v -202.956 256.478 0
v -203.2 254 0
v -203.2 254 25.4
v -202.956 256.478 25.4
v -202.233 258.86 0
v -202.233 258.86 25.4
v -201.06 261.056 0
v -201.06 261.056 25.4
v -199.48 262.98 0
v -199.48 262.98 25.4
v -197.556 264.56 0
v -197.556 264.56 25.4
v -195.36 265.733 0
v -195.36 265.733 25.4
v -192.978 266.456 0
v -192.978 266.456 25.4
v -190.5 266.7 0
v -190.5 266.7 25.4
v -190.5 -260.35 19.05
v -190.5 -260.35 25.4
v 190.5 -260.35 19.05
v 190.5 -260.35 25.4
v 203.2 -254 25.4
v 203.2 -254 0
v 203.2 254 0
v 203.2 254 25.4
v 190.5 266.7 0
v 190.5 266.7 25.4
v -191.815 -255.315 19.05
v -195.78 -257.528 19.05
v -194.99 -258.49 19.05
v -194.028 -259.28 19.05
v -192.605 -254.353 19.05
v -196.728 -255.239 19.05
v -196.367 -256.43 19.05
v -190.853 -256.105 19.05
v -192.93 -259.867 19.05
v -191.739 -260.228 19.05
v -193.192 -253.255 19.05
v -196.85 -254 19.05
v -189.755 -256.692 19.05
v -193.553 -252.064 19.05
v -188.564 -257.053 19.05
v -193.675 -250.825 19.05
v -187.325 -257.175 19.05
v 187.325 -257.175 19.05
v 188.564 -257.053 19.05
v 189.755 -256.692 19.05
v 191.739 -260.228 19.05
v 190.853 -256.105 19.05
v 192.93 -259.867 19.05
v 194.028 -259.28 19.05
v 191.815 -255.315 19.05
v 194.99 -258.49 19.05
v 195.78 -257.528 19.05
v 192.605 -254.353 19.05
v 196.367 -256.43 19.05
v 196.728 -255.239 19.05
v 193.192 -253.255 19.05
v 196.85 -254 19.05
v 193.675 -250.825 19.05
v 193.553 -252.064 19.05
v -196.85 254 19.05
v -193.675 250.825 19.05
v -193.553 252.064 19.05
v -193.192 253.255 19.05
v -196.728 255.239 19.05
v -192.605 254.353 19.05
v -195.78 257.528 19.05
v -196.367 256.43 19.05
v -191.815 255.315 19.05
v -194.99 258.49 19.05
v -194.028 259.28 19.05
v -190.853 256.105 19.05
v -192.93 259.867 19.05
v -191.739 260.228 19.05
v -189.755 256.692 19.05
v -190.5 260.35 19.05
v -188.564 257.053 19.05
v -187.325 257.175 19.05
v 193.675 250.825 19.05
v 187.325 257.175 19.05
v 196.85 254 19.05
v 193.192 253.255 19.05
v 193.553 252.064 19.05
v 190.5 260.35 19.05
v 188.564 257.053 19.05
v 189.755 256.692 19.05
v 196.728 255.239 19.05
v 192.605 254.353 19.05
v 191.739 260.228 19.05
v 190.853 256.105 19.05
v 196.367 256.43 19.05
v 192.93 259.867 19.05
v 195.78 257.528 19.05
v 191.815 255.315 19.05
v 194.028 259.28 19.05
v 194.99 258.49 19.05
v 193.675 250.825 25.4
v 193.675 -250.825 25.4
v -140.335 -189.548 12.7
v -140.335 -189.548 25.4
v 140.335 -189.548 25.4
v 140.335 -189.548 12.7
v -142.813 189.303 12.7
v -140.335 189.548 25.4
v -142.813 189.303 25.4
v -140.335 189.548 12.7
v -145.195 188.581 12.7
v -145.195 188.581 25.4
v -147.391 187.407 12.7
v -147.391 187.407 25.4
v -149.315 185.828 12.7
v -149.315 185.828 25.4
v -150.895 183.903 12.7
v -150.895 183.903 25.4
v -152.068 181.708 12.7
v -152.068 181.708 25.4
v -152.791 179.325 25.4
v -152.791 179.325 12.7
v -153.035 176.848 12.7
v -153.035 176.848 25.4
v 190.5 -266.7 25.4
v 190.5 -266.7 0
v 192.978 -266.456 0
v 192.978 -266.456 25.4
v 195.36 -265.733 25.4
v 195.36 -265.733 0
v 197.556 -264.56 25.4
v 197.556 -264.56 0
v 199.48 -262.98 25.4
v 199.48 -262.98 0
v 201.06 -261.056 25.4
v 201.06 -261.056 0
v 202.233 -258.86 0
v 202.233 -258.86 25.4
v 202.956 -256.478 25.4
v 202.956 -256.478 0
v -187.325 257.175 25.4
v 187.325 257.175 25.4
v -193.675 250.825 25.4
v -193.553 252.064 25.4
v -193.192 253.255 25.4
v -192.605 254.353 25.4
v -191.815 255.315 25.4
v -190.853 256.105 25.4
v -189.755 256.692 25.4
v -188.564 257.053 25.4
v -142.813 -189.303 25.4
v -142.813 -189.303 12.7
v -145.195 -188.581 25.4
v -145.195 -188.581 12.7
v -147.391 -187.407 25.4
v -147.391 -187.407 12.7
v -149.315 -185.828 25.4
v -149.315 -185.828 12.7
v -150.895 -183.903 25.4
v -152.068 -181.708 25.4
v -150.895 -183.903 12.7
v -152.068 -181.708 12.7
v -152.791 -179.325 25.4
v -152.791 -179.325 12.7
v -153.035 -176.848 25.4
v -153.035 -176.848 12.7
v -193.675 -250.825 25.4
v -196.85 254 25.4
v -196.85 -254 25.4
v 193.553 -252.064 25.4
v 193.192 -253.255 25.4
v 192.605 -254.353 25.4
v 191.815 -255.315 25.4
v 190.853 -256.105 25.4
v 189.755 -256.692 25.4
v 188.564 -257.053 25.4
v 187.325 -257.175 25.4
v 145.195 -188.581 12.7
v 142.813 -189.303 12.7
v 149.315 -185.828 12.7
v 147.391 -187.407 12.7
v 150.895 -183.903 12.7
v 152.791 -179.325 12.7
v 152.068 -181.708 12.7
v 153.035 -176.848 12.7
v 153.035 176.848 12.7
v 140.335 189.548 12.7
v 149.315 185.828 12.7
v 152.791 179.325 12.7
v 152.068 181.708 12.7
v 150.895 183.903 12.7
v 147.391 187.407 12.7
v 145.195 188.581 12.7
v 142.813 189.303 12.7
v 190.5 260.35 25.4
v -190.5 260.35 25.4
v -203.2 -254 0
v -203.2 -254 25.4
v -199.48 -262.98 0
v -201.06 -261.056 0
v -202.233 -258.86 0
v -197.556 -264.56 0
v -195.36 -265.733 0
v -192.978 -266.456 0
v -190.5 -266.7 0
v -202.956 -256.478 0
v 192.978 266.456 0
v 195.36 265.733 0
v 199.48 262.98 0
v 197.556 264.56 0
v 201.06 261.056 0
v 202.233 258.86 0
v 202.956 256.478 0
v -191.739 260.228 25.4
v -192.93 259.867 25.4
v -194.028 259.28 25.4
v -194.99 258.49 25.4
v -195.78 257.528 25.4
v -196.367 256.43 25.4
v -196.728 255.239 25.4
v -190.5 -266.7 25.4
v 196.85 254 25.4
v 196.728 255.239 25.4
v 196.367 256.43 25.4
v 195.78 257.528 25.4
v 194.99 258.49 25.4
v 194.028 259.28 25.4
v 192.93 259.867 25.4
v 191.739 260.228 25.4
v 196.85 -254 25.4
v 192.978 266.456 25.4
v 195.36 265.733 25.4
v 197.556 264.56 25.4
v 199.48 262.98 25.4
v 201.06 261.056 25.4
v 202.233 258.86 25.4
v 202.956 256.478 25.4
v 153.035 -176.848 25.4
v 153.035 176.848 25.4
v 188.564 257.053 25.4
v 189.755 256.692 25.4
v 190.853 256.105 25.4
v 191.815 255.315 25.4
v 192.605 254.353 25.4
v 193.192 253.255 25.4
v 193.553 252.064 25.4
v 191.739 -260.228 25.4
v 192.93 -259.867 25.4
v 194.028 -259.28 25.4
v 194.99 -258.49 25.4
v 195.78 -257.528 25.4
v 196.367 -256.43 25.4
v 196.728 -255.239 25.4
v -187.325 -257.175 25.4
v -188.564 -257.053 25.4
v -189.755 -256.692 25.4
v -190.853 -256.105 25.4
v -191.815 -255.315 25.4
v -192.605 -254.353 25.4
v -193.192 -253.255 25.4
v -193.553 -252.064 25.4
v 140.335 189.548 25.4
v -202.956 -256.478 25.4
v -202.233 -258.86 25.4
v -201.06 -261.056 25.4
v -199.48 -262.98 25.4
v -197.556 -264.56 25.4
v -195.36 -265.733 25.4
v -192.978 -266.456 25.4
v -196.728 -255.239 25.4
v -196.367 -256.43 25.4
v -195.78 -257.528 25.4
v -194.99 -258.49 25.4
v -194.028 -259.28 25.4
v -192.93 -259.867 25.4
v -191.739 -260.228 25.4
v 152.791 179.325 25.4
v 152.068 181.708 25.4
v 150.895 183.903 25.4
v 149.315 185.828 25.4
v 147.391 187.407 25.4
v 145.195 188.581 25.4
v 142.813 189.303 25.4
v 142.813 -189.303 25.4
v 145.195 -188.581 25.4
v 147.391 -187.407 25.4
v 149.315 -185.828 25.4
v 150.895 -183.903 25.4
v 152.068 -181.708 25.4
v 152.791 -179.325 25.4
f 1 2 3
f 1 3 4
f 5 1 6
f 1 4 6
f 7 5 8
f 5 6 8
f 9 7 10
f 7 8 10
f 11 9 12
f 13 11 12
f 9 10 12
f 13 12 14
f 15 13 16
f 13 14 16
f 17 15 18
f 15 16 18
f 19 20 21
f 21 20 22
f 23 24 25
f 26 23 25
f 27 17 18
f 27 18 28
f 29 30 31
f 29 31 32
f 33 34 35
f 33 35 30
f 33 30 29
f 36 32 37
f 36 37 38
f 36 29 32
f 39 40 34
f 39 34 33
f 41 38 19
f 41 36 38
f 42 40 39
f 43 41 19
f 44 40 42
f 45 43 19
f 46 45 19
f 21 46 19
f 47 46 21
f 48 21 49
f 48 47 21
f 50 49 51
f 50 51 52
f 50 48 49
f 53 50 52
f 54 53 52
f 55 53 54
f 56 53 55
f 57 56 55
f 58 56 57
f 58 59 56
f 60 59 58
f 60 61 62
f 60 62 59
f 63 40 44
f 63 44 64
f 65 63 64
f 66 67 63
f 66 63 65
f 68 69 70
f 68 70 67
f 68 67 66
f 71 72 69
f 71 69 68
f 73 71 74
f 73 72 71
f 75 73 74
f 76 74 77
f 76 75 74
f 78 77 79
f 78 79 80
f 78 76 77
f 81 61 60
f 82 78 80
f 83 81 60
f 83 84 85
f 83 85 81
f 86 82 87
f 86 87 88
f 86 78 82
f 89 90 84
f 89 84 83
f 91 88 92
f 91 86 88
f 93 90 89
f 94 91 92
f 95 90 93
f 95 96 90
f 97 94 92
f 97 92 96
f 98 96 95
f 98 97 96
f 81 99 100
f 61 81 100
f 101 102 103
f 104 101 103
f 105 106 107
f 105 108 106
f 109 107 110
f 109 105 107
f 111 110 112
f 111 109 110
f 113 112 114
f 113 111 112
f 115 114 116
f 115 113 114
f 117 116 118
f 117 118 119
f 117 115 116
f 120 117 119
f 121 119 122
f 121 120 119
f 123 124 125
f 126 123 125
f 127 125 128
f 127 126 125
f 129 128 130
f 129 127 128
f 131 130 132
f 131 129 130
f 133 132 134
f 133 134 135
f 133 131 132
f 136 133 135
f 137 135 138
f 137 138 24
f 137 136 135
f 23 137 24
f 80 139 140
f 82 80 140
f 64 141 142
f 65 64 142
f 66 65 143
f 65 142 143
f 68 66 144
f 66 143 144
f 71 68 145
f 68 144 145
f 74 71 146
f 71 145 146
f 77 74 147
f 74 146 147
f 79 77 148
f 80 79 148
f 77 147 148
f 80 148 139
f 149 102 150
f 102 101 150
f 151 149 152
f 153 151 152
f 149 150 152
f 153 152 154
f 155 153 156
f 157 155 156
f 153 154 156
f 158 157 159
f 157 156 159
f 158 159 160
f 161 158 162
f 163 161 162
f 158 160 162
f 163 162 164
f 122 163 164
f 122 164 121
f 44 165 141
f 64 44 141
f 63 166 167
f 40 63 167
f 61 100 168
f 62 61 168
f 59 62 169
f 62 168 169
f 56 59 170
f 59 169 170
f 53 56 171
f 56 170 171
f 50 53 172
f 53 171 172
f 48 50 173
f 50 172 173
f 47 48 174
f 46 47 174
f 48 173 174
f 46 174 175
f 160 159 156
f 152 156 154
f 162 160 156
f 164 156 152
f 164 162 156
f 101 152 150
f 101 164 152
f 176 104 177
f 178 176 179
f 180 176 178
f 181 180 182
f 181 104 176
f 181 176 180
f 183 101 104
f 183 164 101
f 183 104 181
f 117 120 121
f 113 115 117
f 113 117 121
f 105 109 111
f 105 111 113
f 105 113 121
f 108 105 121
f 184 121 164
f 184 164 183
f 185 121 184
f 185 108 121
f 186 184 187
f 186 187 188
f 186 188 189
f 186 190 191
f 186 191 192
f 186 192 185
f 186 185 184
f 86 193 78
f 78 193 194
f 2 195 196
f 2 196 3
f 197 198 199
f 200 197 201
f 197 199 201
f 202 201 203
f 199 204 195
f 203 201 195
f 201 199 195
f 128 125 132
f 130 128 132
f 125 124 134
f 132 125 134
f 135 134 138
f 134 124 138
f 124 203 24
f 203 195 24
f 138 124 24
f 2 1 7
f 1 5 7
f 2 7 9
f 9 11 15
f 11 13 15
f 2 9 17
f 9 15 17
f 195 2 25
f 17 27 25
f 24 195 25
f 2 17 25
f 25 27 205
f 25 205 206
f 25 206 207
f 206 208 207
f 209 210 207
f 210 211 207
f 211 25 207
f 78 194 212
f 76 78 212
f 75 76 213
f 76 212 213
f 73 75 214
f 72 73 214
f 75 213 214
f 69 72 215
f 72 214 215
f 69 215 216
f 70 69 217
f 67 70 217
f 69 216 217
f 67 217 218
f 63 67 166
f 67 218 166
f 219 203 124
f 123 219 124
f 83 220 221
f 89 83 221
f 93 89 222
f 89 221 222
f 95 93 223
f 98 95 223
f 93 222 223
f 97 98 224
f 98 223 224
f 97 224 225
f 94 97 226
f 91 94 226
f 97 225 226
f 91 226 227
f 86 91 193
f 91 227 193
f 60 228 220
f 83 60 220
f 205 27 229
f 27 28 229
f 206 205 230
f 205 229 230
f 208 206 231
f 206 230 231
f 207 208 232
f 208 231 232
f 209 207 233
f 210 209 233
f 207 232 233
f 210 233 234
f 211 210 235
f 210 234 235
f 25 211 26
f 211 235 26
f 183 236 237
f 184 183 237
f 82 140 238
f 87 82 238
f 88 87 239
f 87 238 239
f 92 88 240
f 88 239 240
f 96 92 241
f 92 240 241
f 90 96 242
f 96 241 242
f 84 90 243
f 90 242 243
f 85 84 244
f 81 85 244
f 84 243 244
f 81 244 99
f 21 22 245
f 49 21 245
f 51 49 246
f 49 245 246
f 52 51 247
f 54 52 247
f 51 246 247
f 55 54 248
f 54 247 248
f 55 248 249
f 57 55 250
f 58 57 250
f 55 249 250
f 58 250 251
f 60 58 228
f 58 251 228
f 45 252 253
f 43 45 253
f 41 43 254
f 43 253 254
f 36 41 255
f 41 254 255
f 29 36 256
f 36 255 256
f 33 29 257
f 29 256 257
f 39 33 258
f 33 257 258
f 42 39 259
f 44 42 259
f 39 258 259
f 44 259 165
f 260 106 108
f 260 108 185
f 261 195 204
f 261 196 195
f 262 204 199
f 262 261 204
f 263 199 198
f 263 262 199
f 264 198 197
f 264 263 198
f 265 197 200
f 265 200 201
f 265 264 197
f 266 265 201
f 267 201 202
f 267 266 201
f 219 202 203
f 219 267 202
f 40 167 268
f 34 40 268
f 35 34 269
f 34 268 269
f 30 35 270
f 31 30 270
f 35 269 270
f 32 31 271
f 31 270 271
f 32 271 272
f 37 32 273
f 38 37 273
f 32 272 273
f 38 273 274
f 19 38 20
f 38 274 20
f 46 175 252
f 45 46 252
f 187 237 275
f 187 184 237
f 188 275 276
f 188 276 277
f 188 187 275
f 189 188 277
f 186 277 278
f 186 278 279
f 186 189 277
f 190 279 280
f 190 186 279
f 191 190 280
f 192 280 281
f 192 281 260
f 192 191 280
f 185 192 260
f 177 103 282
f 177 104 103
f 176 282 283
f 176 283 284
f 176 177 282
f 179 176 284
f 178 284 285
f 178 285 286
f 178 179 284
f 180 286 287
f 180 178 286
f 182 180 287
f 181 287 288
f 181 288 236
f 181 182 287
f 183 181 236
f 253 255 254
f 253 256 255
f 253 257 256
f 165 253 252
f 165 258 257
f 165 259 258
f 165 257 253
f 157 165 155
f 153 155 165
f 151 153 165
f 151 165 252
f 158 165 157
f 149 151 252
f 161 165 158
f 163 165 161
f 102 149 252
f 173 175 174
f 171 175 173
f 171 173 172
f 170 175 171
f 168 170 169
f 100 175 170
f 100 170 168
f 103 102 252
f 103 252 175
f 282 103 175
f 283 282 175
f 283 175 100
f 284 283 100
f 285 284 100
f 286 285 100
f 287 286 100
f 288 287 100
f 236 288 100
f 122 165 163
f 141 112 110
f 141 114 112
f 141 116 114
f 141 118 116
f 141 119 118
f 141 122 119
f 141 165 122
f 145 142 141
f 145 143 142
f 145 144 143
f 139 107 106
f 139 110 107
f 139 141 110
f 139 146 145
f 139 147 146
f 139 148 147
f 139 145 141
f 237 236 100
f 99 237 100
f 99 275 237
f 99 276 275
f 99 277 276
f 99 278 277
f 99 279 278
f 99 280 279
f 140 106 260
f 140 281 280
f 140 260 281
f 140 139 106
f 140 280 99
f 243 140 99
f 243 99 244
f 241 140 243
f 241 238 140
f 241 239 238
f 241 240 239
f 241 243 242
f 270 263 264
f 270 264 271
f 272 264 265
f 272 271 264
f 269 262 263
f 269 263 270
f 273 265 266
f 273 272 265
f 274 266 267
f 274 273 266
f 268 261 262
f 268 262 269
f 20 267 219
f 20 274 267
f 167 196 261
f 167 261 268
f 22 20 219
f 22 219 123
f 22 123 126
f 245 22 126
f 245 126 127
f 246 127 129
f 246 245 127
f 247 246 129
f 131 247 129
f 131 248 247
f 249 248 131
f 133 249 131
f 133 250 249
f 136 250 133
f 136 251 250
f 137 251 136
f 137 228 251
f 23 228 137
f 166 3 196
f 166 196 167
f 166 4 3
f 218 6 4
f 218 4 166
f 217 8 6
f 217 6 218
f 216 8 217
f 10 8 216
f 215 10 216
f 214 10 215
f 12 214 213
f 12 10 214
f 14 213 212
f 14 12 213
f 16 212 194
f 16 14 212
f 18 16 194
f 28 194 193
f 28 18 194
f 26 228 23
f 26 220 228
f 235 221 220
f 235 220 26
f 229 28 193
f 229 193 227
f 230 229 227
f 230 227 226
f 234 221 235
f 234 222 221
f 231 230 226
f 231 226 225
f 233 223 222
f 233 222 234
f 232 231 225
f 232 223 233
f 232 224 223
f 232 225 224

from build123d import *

# Parameters (mm, degrees)
F0_W     = 406.4
F0_H     = 533.4
F1_DEPTH = 25.4
F2_W     = 306.07
F2_H     = 379.095
F3_DEPTH = 12.7
F4_R     = 12.7
F6_DEPTH = 6.35


with BuildPart() as f1:
    # F0 (on Top) → F1 (new body)
    with BuildSketch(Plane.XY):
        Rectangle(F0_W, F0_H)
    extrude(amount=F1_DEPTH)

    # F2 (on face) → F3 (cut)
    with BuildSketch(Plane.XY.offset(25.4)):
        Rectangle(F2_W, F2_H)
    extrude(amount=-F3_DEPTH, mode=Mode.SUBTRACT)

    # F4
    f4_edges = [f1.edges().sort_by_distance(p)[0] for p in [
        (-203.2, -266.7, 12.7),
        (203.2, -266.7, 12.7),
        (203.2, 266.7, 12.7),
        (-203.2, 266.7, 12.7),
        (-153.035, 189.5475, 19.05),
        (153.035, 189.5475, 19.05),
        (153.035, -189.5475, 19.05),
        (-153.035, -189.5475, 19.05),
    ]]
    fillet(f4_edges, radius=F4_R)

    # F5 (on face) → F6 (cut)
    with BuildSketch(Plane.XY.offset(25.4)):
        with BuildLine():
            Line((-196.85, 254), (-196.85, -254))
            ThreePointArc((-196.85, -254), (-194.990128, -258.490128), (-190.5, -260.35))
            Line((-190.5, -260.35), (190.5, -260.35))
            ThreePointArc((190.5, -260.35), (194.990128, -258.490128), (196.85, -254))
            Line((196.85, -254), (196.85, 254))
            ThreePointArc((196.85, 254), (194.990128, 258.490128), (190.5, 260.35))
            Line((190.5, 260.35), (-190.5, 260.35))
            ThreePointArc((-190.5, 260.35), (-194.990128, 258.490128), (-196.85, 254))
        make_face()
        with BuildLine():
            ThreePointArc((-187.325, -257.175), (-191.815128, -255.315128), (-193.675, -250.825))
            Line((-193.675, -250.825), (-193.675, 250.825))
            ThreePointArc((-193.675, 250.825), (-191.815128, 255.315128), (-187.325, 257.175))
            Line((-187.325, 257.175), (187.325, 257.175))
            ThreePointArc((187.325, 257.175), (191.815128, 255.315128), (193.675, 250.825))
            Line((193.675, 250.825), (193.675, -250.825))
            ThreePointArc((193.675, -250.825), (191.815128, -255.315128), (187.325, -257.175))
            Line((187.325, -257.175), (-187.325, -257.175))
        make_face(mode=Mode.SUBTRACT)
    extrude(amount=-F6_DEPTH, mode=Mode.SUBTRACT)


solid = f1.part
